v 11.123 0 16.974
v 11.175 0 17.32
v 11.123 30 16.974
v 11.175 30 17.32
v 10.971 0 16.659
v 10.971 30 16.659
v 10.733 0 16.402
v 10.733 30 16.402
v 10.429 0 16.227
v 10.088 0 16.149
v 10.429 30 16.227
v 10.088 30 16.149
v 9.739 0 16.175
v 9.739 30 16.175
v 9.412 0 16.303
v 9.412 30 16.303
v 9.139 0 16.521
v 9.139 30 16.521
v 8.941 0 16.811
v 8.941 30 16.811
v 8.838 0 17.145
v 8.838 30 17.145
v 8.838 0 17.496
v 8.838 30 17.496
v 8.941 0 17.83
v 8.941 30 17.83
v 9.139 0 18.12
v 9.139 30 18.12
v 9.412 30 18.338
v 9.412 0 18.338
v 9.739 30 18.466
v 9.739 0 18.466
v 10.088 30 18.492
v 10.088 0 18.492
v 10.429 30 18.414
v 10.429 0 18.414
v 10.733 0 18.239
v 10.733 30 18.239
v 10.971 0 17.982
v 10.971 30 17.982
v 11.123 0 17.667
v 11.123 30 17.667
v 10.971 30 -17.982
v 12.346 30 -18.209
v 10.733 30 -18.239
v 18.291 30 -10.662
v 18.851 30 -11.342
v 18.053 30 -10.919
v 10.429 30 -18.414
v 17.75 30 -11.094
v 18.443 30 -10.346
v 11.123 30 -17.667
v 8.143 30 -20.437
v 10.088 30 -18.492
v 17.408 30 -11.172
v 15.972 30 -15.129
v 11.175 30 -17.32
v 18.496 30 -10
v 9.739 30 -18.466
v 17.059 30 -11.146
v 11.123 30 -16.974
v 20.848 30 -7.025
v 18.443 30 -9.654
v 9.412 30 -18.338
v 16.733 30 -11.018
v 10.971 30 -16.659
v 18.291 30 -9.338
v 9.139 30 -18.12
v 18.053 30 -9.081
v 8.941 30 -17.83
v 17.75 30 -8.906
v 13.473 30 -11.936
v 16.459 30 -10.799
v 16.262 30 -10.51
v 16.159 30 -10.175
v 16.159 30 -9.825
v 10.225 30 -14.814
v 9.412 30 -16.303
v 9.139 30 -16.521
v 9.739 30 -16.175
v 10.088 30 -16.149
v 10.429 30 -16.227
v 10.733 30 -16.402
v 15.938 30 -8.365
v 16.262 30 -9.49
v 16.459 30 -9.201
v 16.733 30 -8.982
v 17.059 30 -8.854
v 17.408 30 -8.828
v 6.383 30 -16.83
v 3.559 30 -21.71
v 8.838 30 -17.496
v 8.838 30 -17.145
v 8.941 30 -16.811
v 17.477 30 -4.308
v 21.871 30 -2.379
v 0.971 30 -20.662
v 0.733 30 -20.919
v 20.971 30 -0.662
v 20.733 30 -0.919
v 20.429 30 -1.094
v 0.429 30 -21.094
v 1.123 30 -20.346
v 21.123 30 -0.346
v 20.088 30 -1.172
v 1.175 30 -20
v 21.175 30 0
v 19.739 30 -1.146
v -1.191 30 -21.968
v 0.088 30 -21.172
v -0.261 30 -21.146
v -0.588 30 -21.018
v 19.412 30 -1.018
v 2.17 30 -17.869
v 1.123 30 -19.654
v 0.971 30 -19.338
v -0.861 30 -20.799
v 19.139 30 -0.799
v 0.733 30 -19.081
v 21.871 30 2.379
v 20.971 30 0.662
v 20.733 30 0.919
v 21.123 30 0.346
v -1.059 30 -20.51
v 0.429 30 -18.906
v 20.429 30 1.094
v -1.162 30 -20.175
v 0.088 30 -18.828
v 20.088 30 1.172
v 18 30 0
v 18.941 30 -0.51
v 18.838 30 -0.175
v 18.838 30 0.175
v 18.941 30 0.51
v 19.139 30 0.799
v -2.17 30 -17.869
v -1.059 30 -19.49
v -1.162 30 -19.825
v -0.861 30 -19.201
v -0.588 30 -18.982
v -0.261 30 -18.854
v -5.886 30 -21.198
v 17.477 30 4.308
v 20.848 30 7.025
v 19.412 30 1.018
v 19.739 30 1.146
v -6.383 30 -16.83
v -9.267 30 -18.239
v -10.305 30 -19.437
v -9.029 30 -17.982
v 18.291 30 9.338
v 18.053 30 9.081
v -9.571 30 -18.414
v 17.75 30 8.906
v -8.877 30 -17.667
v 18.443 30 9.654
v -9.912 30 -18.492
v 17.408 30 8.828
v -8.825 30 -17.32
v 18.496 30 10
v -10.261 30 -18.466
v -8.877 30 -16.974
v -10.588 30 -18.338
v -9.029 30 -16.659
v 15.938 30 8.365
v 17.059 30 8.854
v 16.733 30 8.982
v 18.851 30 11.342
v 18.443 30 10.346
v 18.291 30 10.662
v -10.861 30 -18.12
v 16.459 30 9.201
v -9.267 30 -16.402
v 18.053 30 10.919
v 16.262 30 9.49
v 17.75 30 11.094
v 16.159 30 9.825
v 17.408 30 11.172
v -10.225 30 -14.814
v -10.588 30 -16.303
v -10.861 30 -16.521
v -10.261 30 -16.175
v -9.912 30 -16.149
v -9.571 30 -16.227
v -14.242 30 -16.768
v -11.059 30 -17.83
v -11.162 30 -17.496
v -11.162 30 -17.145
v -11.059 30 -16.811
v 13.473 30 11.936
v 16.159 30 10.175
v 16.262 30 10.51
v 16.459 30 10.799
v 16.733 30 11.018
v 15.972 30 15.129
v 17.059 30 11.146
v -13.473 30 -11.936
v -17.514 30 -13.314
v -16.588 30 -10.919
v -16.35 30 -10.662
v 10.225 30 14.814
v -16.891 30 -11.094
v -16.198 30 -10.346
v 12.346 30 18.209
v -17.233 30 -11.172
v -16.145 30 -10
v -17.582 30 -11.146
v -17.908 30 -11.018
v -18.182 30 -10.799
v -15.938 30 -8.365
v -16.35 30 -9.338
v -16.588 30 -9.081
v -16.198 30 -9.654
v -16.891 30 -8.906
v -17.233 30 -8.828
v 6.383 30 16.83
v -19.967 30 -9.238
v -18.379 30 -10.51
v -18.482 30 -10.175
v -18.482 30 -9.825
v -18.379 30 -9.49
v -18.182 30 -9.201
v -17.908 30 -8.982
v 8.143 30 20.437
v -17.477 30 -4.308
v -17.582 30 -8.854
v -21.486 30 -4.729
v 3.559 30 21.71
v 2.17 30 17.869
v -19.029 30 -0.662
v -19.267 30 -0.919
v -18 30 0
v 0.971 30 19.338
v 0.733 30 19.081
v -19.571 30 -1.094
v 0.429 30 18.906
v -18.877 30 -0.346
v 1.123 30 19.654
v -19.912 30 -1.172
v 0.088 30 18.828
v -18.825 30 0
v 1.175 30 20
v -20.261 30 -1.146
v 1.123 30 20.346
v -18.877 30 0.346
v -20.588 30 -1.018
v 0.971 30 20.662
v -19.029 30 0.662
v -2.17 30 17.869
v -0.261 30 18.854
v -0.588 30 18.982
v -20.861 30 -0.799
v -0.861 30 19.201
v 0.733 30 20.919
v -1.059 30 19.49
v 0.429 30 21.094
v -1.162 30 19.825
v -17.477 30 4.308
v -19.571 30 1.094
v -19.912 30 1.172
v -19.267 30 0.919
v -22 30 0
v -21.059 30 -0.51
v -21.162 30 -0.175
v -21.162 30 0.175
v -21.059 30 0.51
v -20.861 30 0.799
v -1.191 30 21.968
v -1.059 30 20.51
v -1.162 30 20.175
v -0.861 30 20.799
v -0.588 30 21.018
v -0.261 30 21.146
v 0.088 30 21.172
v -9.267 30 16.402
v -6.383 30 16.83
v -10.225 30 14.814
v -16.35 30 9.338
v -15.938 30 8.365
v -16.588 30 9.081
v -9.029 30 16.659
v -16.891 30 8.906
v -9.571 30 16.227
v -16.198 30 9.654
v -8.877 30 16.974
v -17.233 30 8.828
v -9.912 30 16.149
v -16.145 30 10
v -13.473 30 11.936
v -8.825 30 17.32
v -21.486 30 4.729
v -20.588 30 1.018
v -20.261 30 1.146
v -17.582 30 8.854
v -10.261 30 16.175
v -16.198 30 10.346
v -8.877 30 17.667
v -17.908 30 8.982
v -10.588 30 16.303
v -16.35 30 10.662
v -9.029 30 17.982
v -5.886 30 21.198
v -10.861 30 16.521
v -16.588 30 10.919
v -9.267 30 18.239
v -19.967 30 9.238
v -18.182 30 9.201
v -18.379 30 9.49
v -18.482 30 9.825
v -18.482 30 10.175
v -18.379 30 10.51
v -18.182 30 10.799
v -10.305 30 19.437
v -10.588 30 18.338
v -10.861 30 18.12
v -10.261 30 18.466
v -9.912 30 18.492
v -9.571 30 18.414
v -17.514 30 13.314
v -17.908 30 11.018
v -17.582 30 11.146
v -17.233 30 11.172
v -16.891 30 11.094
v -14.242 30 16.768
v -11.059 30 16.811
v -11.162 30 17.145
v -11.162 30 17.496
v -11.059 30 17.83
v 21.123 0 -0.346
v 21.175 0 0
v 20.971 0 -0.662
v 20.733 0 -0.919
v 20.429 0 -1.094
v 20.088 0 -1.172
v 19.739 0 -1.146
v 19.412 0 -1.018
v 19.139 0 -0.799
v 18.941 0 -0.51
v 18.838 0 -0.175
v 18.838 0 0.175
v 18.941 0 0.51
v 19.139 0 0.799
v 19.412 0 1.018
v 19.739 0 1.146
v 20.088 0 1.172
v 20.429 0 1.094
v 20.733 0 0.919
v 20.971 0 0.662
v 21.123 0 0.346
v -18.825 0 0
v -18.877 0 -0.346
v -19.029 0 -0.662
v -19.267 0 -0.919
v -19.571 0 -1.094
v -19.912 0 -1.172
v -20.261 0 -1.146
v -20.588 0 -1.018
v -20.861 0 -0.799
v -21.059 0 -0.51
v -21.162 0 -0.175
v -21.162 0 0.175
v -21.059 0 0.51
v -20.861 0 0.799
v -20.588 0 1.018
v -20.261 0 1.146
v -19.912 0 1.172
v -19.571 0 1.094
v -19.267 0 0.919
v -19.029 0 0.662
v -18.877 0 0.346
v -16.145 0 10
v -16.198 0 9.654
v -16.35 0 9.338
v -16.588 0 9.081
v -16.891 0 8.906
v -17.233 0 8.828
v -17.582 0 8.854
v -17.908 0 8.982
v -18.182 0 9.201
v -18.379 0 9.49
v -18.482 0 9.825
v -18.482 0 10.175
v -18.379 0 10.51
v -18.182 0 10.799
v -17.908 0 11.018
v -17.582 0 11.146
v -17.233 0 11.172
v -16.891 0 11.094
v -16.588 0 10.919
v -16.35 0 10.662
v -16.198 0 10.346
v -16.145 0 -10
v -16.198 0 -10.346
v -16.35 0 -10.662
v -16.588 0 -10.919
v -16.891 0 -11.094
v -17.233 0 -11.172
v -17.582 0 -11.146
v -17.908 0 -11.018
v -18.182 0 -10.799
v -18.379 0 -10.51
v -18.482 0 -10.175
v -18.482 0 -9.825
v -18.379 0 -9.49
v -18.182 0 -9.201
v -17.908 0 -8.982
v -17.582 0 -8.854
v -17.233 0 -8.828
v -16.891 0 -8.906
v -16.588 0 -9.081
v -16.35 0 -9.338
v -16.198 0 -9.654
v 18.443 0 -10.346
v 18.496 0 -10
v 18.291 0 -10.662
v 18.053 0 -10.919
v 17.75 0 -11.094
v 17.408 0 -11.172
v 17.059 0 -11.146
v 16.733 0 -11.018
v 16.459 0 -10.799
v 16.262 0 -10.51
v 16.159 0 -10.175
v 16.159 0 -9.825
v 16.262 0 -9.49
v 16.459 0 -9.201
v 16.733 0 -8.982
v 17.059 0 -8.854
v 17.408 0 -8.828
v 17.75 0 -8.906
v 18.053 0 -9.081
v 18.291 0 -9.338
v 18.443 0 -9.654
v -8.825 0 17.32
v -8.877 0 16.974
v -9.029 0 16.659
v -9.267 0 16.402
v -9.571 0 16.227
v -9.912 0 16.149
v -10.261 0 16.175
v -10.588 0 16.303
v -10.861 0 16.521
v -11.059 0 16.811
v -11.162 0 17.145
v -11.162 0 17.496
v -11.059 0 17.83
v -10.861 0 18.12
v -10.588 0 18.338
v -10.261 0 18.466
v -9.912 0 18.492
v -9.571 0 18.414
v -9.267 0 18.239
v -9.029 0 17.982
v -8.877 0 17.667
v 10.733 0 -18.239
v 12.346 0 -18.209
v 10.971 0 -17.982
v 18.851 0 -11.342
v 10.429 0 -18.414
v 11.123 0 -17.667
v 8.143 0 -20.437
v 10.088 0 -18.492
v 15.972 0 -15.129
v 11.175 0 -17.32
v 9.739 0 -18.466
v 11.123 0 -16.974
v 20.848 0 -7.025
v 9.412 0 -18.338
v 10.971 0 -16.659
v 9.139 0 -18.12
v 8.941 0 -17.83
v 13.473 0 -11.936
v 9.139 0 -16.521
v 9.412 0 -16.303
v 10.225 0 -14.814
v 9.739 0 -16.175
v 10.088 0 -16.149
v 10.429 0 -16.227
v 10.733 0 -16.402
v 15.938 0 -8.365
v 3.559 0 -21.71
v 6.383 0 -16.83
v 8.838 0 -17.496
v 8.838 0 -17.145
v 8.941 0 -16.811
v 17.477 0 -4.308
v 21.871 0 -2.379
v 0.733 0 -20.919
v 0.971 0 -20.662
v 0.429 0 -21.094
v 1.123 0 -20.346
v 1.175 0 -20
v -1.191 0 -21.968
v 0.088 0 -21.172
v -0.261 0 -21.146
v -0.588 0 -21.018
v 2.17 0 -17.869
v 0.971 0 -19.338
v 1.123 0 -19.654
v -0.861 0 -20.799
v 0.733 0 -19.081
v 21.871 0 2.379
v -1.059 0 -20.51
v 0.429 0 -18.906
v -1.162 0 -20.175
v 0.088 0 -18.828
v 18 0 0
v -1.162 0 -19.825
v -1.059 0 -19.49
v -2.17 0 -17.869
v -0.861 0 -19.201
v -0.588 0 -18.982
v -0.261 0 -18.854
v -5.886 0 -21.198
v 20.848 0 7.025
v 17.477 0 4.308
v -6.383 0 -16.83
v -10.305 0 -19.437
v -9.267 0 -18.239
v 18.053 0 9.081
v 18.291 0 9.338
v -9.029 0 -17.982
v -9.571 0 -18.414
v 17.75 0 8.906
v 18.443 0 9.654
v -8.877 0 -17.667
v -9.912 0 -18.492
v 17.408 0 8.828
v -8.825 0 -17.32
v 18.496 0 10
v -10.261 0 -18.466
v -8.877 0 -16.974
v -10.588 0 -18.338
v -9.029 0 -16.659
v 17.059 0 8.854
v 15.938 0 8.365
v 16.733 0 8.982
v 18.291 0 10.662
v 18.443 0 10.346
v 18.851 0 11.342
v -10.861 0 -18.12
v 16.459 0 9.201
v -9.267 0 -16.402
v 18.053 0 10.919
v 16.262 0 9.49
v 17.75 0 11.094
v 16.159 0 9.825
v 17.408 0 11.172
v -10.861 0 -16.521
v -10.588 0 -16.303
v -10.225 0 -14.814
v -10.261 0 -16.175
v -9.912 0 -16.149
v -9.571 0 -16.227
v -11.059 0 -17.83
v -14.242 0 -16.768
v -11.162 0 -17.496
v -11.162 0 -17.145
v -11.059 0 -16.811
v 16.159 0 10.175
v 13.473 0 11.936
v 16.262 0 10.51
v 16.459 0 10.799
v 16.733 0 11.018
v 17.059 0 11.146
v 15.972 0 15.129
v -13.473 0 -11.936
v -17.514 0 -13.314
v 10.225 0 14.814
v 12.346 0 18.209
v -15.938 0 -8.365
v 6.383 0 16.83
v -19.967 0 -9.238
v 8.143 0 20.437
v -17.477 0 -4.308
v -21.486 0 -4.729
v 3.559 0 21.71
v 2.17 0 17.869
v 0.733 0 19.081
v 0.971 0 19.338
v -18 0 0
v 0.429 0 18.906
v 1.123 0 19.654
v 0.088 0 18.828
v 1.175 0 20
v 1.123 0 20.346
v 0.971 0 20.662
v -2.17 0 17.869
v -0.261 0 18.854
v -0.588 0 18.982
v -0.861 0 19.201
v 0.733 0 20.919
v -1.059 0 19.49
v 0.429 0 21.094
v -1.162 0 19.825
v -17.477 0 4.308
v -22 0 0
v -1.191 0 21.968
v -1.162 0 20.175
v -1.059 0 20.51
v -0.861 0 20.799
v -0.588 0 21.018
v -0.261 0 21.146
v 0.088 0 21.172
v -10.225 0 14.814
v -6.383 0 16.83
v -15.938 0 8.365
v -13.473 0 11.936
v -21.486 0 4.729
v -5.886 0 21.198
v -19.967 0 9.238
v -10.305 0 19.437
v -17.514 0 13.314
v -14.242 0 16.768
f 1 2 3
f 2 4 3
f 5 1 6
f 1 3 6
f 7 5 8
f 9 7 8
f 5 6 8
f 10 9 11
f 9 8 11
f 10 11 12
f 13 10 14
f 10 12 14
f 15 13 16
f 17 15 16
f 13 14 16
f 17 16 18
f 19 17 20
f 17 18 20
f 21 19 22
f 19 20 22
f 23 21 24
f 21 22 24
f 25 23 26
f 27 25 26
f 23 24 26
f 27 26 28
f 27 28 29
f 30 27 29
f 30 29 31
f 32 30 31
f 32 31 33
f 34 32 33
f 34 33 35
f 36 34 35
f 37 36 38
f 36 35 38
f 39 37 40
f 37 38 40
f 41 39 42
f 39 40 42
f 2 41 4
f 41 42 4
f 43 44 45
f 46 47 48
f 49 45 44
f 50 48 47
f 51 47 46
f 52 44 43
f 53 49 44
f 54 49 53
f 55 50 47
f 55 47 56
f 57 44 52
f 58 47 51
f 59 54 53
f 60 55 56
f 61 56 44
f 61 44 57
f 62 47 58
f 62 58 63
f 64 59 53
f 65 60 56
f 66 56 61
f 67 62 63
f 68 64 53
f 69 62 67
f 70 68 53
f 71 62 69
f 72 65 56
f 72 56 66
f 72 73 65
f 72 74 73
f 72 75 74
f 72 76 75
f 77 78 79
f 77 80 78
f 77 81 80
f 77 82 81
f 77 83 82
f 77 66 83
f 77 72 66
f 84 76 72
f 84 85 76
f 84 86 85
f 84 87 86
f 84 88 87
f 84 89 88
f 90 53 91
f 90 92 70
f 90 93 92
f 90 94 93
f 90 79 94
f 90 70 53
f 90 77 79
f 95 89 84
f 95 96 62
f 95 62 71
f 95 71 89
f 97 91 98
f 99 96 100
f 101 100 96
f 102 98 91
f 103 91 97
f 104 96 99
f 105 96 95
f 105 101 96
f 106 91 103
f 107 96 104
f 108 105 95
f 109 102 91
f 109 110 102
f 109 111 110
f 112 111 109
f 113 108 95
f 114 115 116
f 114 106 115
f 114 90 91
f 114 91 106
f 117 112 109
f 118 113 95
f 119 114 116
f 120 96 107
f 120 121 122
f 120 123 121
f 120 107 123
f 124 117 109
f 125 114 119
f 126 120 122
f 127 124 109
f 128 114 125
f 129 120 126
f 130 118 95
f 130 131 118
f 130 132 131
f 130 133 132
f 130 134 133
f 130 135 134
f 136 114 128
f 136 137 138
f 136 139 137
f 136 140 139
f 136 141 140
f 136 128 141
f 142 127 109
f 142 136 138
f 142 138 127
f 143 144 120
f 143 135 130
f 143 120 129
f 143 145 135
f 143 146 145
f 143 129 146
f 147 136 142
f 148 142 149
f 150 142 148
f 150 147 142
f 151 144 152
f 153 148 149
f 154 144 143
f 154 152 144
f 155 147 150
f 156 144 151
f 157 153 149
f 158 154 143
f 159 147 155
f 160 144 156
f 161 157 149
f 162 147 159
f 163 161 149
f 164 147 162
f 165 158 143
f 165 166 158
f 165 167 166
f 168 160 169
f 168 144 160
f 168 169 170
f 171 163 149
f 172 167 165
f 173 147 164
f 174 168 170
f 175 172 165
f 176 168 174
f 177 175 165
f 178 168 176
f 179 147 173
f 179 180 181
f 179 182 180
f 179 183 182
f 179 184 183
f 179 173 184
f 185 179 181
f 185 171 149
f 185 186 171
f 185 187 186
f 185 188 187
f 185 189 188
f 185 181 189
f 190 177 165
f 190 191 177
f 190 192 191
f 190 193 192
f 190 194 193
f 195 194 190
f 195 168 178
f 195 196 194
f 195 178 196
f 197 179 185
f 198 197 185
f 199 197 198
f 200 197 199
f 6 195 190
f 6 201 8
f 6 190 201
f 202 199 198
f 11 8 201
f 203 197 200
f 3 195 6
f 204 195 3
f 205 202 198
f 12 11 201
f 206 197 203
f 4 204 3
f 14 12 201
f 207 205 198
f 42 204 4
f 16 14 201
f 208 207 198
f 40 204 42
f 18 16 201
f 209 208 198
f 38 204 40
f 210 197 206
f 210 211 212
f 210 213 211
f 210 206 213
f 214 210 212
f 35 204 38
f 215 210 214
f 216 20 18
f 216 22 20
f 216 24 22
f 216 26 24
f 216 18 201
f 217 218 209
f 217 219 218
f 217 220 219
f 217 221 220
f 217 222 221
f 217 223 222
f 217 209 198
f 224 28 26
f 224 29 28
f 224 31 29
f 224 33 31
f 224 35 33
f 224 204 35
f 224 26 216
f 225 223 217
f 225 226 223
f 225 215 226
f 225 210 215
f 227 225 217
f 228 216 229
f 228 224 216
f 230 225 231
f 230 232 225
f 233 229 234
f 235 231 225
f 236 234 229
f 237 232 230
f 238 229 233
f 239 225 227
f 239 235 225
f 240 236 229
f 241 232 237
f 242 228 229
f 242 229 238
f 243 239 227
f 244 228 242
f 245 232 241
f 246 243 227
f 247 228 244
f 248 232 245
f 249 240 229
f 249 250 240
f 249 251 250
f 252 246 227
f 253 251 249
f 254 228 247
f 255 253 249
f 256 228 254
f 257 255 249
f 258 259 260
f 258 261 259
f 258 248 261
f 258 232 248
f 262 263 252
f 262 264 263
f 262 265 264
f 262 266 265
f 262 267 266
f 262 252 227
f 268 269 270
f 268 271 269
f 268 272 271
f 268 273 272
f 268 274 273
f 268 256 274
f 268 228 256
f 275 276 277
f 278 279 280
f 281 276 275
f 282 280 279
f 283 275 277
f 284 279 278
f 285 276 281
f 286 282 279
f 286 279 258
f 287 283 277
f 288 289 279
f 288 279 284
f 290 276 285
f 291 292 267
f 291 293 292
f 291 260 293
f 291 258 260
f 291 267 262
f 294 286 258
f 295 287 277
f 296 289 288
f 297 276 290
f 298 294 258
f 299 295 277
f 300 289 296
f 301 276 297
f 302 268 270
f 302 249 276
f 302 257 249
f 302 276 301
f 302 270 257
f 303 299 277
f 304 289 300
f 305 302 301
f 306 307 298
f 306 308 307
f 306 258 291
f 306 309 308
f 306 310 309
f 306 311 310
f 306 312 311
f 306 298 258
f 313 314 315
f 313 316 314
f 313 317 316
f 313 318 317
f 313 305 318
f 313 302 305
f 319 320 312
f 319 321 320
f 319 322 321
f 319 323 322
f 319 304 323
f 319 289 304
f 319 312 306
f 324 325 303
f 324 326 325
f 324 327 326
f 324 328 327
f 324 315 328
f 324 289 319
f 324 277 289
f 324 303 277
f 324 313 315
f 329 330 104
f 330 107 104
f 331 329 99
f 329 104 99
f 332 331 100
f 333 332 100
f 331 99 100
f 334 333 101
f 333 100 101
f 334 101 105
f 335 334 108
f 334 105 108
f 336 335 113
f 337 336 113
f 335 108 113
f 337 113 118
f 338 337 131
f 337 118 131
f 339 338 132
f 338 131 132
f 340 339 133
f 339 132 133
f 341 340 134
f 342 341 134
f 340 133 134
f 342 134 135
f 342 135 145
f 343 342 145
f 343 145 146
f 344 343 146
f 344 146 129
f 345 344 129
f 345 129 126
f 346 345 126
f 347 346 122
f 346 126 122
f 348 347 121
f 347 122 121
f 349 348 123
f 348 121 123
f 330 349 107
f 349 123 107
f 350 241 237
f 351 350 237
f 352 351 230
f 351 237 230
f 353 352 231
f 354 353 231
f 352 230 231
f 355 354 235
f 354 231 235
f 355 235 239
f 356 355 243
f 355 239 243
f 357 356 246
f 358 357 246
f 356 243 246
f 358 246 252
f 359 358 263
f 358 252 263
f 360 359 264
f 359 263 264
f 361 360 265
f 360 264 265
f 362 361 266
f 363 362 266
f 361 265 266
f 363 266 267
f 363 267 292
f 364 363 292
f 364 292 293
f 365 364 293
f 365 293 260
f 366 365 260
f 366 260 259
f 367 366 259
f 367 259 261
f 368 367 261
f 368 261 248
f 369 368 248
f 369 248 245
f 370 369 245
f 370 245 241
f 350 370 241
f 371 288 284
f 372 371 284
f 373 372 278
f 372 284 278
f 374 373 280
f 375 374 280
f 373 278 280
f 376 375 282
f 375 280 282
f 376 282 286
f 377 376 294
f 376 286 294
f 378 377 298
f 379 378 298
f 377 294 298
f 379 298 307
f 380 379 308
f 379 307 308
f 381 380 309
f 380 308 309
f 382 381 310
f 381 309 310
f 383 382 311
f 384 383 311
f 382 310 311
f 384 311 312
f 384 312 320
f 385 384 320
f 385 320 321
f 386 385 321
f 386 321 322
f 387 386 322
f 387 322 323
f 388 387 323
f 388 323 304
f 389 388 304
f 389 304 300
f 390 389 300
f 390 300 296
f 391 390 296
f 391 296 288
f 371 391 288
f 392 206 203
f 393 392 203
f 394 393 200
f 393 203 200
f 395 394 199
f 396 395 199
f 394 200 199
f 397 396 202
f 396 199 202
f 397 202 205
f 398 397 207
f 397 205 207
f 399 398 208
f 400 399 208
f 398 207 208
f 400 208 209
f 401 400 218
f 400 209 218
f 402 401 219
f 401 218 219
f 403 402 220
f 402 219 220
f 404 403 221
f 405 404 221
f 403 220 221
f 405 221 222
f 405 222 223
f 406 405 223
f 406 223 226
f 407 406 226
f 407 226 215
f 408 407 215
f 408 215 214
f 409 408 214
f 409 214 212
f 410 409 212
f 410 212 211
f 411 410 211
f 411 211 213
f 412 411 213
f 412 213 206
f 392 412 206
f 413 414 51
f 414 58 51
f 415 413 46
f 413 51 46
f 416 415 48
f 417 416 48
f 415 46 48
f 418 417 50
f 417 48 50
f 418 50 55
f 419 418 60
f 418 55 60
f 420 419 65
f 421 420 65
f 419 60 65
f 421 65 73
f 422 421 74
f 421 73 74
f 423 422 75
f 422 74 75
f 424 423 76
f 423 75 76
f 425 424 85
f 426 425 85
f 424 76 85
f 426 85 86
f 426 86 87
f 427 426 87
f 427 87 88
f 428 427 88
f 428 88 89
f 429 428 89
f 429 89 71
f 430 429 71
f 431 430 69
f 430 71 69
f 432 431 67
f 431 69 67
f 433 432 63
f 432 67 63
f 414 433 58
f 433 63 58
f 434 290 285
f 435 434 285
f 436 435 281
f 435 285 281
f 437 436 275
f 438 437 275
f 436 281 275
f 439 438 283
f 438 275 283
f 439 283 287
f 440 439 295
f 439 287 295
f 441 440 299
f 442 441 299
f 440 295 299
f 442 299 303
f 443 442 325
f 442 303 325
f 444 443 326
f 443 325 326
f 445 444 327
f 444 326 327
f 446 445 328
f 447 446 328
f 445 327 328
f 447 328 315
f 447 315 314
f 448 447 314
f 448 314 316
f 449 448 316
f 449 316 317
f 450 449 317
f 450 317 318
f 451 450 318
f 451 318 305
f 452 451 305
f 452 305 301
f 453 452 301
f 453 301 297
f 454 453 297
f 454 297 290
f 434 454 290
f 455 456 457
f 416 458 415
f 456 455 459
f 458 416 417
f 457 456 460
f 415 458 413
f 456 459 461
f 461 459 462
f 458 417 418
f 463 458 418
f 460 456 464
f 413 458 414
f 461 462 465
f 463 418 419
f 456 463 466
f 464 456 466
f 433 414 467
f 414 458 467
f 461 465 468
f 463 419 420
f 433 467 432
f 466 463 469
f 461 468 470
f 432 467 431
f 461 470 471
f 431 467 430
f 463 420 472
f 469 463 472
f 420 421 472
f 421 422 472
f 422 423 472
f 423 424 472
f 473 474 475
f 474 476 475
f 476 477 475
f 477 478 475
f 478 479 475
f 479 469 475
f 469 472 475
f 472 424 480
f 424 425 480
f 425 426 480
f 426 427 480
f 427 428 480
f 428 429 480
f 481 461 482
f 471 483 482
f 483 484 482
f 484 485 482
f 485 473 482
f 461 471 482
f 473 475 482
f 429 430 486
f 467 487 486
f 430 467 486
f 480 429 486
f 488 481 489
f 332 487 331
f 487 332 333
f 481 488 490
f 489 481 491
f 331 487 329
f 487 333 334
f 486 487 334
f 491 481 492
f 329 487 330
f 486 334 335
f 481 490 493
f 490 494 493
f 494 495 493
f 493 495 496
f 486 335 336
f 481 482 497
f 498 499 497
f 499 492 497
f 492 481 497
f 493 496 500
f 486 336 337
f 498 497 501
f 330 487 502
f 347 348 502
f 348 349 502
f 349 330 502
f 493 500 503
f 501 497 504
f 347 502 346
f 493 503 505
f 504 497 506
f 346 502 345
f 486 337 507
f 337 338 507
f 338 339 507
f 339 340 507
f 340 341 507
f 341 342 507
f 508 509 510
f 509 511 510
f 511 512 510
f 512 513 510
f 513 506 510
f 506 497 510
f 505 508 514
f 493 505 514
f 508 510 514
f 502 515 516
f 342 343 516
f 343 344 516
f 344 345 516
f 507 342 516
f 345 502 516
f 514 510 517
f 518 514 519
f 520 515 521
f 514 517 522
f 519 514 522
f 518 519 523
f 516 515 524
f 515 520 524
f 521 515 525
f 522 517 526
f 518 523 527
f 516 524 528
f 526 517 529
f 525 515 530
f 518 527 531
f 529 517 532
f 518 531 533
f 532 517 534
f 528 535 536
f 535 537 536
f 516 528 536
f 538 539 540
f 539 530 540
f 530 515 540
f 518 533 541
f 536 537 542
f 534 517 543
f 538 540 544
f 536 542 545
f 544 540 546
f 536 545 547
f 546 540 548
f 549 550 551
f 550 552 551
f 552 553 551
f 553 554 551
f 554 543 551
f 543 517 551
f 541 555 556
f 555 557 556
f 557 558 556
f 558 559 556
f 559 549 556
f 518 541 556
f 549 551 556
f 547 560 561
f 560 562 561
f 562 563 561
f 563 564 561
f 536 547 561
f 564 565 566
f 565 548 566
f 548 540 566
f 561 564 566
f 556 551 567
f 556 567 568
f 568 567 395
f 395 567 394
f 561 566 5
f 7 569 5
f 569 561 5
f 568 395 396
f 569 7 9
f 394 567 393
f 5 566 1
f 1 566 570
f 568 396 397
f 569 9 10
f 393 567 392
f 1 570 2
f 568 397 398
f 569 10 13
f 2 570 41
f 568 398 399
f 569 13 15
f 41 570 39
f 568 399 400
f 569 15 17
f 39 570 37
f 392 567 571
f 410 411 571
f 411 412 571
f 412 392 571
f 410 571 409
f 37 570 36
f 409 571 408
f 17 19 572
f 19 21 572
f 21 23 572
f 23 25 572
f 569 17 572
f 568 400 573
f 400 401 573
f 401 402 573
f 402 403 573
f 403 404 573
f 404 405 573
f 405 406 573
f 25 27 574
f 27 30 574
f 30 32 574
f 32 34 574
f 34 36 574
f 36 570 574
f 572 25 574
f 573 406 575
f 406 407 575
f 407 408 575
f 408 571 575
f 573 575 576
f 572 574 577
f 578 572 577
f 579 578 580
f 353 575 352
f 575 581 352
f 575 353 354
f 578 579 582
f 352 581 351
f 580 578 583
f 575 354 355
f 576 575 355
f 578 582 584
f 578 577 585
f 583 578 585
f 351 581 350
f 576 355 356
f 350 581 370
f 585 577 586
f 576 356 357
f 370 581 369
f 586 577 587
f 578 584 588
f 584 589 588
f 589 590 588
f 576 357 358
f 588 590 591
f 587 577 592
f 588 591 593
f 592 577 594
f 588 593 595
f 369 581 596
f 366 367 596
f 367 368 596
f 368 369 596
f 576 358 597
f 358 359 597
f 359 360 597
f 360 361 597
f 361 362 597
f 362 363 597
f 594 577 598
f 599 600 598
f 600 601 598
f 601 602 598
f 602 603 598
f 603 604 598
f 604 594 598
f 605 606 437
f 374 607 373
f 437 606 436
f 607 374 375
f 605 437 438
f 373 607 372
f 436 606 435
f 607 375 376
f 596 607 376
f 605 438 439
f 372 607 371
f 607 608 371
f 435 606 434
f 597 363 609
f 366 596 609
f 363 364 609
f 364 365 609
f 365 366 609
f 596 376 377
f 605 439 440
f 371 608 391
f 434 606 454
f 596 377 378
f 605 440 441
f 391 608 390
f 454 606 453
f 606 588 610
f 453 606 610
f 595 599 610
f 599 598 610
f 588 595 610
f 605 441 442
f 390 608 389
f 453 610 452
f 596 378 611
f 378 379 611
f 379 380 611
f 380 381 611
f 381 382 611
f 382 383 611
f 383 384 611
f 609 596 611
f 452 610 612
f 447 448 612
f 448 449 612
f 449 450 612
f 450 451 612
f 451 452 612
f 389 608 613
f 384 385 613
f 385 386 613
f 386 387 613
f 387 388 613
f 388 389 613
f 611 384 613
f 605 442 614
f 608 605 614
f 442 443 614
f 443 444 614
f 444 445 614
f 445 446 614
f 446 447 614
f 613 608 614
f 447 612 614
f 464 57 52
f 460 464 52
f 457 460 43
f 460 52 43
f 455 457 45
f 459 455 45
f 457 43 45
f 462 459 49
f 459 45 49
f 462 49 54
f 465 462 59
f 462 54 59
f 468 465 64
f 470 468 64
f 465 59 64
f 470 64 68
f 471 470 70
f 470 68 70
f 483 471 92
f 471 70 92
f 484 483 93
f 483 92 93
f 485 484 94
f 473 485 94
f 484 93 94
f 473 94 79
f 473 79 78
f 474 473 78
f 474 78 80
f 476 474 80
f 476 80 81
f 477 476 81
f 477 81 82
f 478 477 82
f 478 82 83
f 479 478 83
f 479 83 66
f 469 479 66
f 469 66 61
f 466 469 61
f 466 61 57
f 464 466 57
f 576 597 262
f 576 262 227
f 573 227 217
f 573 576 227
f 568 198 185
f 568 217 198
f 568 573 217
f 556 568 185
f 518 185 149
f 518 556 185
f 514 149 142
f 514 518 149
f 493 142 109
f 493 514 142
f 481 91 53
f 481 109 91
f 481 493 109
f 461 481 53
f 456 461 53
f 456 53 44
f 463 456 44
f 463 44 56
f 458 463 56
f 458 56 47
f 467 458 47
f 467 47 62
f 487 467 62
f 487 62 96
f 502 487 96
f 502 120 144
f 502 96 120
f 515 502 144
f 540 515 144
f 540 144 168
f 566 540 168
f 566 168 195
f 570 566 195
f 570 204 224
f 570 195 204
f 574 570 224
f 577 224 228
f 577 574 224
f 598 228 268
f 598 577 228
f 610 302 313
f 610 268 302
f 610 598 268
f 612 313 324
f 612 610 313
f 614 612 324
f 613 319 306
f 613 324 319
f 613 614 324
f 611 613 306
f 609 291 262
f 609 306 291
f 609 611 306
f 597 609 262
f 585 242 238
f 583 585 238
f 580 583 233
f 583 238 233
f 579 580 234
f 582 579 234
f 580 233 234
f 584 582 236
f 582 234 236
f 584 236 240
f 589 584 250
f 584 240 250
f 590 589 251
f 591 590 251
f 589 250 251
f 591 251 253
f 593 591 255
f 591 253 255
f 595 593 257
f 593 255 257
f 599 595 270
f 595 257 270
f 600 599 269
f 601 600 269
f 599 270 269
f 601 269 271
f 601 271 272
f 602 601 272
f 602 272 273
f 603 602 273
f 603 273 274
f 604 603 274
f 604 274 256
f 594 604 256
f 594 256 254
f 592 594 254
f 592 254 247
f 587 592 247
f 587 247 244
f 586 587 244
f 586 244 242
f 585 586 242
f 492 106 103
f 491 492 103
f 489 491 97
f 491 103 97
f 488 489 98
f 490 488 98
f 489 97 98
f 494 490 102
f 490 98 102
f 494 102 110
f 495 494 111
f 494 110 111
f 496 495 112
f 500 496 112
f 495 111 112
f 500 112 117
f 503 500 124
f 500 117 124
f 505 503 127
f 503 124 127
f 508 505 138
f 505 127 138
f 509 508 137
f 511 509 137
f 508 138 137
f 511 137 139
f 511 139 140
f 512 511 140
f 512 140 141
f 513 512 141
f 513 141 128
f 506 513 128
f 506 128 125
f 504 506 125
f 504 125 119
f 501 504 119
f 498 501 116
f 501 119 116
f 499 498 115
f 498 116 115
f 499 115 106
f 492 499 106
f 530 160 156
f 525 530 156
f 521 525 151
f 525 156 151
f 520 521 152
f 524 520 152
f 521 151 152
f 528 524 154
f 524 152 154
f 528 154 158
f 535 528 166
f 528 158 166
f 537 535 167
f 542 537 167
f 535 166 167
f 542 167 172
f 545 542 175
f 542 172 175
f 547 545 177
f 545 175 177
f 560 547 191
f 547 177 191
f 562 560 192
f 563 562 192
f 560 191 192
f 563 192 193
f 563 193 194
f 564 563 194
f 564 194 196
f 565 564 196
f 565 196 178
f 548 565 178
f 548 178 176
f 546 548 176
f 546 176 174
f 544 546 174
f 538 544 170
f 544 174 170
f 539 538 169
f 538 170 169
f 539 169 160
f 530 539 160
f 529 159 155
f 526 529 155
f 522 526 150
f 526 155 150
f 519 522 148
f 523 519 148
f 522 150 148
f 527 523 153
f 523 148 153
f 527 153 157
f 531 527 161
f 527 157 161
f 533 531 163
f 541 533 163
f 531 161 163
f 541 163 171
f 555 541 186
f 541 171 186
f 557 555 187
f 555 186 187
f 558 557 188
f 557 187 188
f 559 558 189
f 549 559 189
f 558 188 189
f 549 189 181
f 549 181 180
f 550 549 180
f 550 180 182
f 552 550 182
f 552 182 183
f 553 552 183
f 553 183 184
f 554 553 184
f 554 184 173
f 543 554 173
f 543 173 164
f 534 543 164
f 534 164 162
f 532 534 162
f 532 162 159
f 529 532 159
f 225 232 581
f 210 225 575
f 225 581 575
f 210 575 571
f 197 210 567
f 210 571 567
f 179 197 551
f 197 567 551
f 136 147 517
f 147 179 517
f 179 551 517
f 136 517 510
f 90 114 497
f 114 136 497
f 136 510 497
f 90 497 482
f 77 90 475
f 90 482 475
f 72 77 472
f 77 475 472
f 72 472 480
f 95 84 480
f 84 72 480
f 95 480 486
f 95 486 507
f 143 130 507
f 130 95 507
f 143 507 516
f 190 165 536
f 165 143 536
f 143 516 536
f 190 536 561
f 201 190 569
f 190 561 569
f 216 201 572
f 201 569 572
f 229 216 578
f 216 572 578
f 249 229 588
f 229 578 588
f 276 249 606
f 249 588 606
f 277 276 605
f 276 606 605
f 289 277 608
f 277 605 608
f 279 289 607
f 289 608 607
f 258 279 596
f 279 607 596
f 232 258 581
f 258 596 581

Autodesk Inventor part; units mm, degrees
ref_plane "YZ Plane" through (0, 0, 0) normal (1, 0, 0) x (0, 1, 0)
ref_plane "XZ Plane" through (0, 0, 0) normal (0, 1, 0) x (-1, 0, 0)
ref_plane "XY Plane" through (0, 0, 0) normal (0, 0, 1) x (1, 0, 0)
sketch "Sketch1" plane through (0, 0, 0) normal (0, 1, 0) x (-1, 0, 0)
  circle A0 centre (0, 0) radius 18
  circle A1 centre (0, 0) radius 22
  dimension "d0" = 36
  dimension "d1" = 44
extrude "Extrusion1" add sketch "Sketch1" along normal blind 30
sketch "Sketch2" plane through (0, 30, 0) normal (0, 1, 0) x (1, 0, 0)
  circle A0 centre (-20, 0) radius 1.175
  circle A1 centre (-17.3205, -10) radius 1.175
  circle A2 centre (-10, -17.3205) radius 1.175
  circle A3 centre (0, -20) radius 1.175
  circle A4 centre (10, -17.3205) radius 1.175
  circle A5 centre (17.3205, -10) radius 1.175
  circle A6 centre (20, 0) radius 1.175
  circle A7 centre (17.3205, 10) radius 1.175
  circle A8 centre (10, 17.3205) radius 1.175
  circle A9 centre (0, 20) radius 1.175
  circle A10 centre (-10, 17.3205) radius 1.175
  circle A11 centre (-17.3205, 10) radius 1.175
  point P0 (0, 0)
  dimension "d4" = 2.35
  dimension "d5" = 0
  dimension "d6" = 20
  dimension "d9" = 360
extrude "Extrusion2" cut sketch "Sketch2" against normal through all
properties part number "drive_sprocket_middle"
